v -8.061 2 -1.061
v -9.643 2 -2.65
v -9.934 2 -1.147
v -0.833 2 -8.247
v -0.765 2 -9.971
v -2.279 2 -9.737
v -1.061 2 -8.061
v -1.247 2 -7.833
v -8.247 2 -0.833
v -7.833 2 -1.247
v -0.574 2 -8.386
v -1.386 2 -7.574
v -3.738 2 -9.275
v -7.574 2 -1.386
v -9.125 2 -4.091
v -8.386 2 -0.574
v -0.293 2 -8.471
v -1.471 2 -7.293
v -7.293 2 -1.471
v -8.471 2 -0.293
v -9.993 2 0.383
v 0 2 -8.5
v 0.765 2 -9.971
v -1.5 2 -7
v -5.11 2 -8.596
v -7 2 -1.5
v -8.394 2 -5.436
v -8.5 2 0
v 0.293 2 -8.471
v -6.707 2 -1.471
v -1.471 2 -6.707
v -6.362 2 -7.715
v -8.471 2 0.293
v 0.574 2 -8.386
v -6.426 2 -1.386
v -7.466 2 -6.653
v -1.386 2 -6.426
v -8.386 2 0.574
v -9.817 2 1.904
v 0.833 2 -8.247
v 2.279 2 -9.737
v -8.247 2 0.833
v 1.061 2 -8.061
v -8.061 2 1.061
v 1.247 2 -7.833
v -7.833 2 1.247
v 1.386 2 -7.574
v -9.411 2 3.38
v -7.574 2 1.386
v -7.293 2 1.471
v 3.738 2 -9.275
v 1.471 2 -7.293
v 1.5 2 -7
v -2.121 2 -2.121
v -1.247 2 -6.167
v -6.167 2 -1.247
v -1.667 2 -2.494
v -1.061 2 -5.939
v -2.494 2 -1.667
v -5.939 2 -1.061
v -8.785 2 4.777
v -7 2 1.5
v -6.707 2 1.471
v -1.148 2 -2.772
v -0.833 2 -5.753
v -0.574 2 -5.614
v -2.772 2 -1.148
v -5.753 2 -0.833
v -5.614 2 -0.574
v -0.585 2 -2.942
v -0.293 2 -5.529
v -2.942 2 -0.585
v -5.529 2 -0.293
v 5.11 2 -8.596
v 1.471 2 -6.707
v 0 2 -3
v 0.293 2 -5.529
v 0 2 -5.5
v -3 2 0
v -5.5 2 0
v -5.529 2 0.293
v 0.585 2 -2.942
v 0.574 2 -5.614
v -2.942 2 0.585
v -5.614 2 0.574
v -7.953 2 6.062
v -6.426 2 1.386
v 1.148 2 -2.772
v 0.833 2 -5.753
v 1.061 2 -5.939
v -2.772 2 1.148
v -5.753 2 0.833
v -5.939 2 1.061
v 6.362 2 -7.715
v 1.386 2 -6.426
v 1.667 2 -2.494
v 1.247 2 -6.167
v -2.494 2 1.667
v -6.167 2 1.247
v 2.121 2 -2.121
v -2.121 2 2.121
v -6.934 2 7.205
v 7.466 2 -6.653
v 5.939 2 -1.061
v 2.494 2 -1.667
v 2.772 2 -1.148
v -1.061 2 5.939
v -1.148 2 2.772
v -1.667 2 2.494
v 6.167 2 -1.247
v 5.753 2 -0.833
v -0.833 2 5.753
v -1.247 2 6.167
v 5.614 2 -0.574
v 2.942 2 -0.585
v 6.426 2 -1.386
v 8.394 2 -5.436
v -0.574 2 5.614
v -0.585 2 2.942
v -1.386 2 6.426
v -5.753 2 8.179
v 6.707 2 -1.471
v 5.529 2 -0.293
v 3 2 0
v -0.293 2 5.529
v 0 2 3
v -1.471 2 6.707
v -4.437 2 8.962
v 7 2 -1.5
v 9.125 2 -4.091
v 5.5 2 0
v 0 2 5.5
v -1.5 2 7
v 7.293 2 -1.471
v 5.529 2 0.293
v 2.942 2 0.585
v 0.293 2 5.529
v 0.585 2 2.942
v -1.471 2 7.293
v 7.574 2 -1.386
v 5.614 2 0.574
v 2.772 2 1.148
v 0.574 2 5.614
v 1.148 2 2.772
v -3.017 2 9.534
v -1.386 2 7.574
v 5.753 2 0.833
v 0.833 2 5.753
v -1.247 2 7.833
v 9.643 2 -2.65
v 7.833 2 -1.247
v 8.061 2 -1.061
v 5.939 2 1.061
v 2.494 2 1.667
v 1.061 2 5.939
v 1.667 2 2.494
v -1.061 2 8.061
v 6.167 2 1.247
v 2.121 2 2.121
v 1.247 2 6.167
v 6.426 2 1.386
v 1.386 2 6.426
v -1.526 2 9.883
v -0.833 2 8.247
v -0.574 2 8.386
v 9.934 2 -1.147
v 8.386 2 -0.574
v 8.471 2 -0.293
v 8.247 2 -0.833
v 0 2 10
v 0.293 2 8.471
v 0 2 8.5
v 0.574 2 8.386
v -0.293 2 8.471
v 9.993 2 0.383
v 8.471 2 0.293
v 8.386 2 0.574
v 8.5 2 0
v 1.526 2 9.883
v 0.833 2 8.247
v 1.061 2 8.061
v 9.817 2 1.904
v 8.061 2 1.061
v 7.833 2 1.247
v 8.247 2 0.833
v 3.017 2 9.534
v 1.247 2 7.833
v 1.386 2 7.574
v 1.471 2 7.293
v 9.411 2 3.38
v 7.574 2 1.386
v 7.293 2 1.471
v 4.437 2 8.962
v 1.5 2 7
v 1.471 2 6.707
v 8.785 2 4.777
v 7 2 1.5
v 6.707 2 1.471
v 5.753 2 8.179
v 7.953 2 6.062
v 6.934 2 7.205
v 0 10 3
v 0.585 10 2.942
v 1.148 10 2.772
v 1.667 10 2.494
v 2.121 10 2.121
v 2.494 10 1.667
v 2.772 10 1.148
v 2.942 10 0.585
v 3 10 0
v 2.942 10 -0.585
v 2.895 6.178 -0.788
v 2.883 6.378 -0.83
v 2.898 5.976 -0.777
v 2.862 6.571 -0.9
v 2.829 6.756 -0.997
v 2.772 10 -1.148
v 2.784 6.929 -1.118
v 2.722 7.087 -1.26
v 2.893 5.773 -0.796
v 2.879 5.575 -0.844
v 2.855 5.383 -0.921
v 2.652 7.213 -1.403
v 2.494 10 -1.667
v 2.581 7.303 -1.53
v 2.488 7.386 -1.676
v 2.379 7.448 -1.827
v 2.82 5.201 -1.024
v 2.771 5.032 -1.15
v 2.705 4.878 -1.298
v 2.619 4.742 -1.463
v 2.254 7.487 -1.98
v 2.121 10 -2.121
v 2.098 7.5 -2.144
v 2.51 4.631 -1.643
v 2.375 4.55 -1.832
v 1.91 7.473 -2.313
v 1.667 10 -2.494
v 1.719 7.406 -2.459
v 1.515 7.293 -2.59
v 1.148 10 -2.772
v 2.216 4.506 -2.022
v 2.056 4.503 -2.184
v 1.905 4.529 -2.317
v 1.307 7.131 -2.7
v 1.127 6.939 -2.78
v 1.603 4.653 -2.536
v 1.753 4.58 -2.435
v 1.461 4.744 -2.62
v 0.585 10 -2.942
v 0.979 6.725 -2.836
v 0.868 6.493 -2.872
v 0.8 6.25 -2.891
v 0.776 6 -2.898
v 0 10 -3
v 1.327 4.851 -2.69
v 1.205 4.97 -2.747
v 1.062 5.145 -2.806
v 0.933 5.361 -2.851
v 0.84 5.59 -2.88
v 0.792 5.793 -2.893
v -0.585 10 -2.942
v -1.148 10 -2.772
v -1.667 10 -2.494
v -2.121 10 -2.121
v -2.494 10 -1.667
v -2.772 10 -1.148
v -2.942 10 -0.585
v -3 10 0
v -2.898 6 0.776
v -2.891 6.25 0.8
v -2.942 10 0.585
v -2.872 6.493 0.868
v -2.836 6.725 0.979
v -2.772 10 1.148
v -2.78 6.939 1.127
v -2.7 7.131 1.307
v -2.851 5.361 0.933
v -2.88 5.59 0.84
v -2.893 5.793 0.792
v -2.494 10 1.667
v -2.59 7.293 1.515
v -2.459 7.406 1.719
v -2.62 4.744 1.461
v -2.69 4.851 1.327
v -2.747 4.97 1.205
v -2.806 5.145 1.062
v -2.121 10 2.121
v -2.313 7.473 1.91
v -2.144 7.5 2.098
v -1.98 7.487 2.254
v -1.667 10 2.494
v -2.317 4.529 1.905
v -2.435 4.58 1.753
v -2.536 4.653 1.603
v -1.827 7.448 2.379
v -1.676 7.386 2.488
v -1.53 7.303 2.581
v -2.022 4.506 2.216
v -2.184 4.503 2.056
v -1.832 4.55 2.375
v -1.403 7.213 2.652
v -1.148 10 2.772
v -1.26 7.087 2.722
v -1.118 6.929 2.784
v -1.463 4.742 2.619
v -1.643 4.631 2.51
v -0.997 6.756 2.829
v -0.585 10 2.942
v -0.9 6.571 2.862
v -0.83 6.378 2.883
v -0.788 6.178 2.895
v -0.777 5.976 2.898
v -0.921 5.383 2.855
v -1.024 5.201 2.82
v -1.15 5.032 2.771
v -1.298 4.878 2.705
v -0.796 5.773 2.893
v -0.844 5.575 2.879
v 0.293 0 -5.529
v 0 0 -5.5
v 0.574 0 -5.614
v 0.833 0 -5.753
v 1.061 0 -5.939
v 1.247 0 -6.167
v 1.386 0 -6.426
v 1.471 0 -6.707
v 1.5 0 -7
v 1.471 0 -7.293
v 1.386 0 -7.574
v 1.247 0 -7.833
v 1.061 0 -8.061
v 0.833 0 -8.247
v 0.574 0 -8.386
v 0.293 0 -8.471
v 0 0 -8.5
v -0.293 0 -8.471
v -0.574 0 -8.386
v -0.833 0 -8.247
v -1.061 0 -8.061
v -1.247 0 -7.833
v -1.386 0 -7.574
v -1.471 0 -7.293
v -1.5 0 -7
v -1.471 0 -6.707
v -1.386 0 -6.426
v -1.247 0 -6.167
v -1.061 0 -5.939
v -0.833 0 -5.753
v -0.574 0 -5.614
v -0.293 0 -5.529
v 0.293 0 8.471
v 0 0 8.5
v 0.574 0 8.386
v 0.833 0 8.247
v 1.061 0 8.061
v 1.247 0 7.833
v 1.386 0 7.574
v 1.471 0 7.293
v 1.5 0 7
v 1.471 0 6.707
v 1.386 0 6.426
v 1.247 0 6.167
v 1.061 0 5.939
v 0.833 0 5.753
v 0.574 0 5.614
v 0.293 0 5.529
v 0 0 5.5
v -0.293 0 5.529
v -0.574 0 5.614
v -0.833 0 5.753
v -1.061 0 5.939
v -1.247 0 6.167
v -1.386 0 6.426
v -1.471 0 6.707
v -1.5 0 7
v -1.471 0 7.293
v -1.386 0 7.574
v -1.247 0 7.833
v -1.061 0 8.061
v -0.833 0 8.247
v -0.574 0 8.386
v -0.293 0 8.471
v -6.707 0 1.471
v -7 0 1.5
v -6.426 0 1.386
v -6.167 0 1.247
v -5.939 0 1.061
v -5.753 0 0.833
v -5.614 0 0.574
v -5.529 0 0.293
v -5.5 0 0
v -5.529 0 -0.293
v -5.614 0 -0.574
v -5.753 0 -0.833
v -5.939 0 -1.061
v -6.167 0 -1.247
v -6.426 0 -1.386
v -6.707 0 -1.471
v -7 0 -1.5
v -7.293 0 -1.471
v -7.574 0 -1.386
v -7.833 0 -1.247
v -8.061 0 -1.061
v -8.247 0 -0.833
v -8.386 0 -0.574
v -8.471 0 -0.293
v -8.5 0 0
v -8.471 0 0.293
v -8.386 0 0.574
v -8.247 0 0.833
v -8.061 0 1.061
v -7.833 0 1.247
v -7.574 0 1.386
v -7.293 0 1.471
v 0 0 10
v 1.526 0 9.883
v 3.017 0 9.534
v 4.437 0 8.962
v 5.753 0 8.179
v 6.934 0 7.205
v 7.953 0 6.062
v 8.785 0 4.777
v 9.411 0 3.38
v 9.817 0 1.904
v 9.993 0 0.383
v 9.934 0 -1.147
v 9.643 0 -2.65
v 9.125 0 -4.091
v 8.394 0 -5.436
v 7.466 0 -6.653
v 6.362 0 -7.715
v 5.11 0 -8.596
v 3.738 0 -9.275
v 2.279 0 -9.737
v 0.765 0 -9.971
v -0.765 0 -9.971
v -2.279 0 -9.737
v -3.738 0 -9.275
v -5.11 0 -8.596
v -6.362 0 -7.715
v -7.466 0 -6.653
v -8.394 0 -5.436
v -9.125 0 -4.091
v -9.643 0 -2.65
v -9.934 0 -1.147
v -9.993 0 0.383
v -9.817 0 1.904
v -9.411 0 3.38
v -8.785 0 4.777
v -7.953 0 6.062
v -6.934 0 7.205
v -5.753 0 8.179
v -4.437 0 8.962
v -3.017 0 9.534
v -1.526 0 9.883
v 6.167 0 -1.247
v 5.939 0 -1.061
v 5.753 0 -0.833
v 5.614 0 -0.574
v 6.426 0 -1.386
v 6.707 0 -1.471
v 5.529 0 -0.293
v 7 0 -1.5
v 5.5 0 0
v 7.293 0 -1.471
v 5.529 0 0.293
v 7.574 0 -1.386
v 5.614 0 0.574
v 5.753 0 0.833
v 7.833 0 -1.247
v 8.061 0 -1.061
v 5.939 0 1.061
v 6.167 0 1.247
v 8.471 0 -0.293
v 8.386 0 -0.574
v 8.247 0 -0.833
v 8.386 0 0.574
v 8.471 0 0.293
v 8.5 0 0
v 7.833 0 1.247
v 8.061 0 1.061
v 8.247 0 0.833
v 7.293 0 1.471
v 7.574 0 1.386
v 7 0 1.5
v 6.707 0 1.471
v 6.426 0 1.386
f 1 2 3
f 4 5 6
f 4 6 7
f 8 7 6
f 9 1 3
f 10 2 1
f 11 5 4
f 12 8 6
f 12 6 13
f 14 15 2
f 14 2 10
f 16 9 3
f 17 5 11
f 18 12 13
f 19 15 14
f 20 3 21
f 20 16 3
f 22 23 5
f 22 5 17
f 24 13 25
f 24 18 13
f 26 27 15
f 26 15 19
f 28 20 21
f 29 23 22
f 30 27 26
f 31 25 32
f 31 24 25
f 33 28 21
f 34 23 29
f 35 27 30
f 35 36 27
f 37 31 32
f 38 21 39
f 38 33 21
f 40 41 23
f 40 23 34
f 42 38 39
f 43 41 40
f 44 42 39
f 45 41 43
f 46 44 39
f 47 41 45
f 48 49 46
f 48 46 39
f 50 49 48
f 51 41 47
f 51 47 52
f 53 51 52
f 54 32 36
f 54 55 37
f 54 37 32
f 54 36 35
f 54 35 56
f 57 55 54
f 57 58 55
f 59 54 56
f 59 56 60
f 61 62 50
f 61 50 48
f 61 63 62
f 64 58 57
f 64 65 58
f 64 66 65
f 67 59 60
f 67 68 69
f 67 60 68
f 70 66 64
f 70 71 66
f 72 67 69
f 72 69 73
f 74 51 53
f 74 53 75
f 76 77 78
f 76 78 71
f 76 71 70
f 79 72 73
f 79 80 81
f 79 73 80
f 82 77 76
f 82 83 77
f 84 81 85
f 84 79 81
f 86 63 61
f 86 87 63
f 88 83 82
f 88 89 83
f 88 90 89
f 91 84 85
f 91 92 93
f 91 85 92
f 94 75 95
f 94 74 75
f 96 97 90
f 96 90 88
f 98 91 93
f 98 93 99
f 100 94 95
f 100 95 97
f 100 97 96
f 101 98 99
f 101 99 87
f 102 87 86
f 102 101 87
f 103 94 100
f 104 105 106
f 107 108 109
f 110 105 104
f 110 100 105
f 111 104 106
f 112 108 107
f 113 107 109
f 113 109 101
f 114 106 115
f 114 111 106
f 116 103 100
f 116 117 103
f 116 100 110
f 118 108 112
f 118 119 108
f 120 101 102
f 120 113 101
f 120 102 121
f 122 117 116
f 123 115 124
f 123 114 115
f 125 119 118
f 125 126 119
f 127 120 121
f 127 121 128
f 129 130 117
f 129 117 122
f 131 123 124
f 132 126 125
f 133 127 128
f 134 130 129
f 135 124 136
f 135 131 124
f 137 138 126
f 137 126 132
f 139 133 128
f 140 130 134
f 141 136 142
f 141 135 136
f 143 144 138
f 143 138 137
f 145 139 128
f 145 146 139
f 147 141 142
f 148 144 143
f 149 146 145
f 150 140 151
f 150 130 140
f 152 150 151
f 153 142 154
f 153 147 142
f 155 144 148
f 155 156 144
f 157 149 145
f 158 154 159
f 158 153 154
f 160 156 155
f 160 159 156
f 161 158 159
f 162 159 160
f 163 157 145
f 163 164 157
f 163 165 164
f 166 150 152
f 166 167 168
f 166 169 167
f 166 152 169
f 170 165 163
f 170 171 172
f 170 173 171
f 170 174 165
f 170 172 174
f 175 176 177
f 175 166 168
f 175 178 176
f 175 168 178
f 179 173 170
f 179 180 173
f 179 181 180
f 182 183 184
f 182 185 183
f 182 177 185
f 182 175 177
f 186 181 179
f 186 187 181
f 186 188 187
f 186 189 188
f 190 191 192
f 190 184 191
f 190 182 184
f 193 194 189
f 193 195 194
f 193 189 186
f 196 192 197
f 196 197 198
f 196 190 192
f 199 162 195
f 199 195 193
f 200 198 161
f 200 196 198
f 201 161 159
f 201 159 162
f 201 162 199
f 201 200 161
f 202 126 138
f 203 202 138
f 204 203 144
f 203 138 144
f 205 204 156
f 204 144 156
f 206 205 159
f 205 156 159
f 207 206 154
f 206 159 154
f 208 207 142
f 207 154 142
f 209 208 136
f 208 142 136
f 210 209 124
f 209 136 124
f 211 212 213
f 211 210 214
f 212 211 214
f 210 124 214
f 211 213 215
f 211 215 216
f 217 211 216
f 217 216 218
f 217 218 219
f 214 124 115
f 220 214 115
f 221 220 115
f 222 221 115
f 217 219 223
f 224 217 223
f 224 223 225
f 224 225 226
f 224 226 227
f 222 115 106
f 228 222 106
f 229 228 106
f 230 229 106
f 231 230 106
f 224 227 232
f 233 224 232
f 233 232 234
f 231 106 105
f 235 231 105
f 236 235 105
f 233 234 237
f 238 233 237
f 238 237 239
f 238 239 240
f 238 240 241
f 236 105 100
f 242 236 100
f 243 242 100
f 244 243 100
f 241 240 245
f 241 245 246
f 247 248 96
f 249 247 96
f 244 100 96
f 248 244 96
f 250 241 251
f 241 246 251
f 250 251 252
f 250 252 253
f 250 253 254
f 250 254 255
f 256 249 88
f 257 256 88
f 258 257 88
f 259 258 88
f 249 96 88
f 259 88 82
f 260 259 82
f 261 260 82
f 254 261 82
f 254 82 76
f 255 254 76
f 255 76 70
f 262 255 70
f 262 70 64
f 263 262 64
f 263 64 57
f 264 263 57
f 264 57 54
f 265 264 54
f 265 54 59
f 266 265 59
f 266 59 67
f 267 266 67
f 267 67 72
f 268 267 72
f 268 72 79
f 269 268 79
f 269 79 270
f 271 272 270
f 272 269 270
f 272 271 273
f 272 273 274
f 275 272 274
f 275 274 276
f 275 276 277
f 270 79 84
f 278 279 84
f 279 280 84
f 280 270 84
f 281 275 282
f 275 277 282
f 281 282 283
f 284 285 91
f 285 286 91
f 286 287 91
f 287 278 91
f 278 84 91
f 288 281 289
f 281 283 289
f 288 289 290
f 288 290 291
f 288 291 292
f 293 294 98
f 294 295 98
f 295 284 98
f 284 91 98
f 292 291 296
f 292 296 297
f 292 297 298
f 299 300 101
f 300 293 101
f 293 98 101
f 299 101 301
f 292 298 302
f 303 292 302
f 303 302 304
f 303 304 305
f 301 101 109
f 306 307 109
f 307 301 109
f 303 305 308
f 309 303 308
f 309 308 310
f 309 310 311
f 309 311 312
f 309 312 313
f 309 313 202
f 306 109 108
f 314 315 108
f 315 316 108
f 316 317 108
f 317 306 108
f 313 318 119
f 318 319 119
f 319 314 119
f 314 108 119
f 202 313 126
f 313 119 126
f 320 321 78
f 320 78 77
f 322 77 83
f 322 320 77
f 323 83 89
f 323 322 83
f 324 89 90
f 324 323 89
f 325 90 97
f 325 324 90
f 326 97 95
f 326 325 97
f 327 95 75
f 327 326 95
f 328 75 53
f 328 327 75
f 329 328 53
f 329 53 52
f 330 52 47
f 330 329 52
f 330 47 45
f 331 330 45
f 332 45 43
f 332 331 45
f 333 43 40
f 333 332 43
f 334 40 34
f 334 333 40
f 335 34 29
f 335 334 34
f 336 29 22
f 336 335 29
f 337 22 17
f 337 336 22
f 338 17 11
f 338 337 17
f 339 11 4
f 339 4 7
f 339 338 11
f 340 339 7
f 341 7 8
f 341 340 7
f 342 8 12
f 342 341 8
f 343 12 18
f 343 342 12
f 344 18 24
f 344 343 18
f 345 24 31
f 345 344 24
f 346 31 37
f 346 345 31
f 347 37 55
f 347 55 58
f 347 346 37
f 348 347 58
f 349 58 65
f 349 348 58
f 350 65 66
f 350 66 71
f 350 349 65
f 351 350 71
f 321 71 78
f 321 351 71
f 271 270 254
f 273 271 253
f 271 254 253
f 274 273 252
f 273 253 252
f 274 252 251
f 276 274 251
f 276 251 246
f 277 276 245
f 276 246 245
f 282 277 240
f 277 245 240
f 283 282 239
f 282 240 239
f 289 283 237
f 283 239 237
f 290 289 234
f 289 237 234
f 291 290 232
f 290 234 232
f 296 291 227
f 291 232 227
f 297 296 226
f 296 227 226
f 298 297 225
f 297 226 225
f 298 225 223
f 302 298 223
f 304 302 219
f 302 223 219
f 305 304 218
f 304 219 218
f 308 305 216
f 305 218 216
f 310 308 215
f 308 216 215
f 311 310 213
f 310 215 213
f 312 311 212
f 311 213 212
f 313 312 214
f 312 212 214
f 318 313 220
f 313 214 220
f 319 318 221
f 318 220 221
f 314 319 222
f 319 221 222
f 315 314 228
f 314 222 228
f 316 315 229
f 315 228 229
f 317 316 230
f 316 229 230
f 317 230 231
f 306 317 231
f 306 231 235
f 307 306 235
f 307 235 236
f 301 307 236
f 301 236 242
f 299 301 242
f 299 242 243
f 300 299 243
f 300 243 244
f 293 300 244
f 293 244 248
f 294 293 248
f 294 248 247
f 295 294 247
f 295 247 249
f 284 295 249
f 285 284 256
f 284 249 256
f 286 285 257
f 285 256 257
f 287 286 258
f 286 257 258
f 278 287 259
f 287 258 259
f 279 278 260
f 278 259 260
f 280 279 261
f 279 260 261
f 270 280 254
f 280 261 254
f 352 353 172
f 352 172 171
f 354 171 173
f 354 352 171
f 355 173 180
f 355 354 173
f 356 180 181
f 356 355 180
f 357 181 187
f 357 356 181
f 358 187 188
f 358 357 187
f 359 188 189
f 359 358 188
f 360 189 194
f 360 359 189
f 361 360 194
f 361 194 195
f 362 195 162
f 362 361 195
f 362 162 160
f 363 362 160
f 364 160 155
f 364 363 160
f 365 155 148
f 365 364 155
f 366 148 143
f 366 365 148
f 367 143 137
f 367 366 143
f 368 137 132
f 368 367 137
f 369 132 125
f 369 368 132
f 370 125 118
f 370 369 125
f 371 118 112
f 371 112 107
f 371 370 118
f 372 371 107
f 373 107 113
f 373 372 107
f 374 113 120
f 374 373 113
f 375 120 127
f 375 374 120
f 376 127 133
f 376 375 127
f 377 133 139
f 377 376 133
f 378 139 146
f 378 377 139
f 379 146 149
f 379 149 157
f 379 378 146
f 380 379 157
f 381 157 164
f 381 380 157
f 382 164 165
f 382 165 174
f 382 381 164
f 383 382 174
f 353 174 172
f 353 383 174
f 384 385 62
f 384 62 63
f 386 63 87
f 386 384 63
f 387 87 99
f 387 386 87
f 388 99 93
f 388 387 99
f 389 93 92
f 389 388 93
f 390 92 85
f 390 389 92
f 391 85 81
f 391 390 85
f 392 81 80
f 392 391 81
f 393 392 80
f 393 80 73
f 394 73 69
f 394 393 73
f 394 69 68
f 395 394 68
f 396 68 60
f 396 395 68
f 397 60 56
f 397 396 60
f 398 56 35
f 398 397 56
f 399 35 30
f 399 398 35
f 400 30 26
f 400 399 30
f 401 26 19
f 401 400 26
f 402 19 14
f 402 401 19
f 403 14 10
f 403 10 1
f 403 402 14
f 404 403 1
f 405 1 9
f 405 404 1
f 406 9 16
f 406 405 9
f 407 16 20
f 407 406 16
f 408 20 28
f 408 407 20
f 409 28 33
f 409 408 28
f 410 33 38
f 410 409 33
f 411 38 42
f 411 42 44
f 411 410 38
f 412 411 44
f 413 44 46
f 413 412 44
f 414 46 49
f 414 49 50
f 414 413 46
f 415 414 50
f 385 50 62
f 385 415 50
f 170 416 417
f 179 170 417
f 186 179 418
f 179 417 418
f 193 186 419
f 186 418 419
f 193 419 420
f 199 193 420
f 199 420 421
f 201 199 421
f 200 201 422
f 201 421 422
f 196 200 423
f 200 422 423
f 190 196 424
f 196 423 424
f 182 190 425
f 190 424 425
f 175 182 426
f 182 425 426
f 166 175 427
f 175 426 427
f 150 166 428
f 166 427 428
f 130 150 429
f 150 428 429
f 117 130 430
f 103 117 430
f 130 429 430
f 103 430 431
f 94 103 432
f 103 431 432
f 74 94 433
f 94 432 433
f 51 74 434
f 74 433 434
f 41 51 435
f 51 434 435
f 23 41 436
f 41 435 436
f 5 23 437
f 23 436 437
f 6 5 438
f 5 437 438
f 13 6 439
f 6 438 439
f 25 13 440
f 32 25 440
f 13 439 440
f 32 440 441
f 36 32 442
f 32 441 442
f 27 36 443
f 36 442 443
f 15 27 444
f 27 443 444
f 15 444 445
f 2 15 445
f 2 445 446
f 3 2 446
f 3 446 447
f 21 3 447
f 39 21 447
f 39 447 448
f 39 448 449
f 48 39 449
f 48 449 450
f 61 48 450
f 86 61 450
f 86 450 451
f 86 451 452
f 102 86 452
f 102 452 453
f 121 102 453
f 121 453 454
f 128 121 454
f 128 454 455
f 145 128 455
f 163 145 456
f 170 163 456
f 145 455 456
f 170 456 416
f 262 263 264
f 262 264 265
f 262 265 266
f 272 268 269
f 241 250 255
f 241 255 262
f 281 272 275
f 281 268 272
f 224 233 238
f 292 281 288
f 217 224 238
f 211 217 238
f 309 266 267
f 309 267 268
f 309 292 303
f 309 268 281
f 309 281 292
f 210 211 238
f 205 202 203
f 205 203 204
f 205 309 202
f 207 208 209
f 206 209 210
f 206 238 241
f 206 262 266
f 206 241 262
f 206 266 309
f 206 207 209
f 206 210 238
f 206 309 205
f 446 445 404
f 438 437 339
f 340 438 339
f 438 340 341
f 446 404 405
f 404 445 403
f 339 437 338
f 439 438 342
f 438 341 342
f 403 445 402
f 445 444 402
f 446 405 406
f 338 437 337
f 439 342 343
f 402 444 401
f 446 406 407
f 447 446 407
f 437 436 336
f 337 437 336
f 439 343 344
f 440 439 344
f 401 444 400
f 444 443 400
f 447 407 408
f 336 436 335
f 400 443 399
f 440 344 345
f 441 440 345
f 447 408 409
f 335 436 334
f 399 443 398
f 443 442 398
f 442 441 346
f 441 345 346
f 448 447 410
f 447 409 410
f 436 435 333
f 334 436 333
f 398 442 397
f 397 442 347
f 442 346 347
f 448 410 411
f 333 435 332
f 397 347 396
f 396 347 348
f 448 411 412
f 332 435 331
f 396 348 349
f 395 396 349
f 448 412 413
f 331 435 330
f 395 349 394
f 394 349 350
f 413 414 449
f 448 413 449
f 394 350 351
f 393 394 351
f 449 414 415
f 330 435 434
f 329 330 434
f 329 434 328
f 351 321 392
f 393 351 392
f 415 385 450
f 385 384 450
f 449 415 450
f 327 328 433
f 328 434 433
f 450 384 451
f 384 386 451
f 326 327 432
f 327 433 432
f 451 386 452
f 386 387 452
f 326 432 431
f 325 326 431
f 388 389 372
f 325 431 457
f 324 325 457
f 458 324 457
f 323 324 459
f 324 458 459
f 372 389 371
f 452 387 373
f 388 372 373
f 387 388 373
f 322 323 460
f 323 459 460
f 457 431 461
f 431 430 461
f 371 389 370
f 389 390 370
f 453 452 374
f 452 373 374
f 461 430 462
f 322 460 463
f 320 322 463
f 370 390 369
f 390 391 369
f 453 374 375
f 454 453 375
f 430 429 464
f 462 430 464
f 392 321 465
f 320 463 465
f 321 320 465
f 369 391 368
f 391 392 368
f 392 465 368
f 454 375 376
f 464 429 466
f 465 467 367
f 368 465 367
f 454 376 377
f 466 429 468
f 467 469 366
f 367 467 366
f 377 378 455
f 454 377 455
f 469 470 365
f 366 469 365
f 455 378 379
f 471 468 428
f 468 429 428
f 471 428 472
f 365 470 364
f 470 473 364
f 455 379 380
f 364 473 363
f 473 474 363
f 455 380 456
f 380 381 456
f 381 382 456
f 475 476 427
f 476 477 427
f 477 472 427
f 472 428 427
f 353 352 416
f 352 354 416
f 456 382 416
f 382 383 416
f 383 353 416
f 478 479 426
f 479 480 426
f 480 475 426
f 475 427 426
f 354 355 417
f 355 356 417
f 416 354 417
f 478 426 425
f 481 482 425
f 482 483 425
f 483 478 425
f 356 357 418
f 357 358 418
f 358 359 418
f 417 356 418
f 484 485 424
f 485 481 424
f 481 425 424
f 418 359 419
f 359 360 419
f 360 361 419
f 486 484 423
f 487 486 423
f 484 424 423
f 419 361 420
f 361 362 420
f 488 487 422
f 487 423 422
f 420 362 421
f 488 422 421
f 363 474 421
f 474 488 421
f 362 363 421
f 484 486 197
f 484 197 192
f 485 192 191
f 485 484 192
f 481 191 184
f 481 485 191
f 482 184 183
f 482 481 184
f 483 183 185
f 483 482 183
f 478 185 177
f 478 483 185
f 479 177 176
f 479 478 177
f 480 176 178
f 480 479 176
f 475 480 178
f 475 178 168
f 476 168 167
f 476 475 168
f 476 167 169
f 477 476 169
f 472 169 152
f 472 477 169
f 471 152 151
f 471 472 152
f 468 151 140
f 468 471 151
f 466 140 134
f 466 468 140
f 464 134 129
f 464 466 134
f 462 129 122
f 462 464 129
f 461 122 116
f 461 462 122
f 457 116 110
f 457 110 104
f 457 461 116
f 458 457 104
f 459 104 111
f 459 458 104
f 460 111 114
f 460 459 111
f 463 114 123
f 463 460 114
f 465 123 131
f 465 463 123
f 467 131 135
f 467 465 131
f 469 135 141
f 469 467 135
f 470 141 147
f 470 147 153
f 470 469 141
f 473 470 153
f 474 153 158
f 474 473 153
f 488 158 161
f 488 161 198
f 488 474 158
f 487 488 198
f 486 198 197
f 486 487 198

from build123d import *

# Parameters (mm, degrees)
SKETCH_1_R          = 10
SKETCH_1_R_2        = 3
SKETCH_1_R_3        = 1.5
EXTRUDE_1_DEPTH     = 2
SKETCH_2_R          = 3
EXTRUDE_2_DEPTH     = 10
SKETCH_5_R          = 1.5
CUT_EXTRUDE_3_DEPTH = 5


with BuildPart() as part:
    # 草图1 → 凸台-拉伸1 (new body)
    with BuildSketch(Plane(origin=(0, 0, 0), x_dir=(1, 0, 0), z_dir=(0, 1, 0))):
        Circle(SKETCH_1_R)
        Circle(SKETCH_1_R_2, mode=Mode.SUBTRACT)
        with Locations((0, 7)):
            Circle(SKETCH_1_R_3, mode=Mode.SUBTRACT)
        with Locations((7, 0)):
            Circle(SKETCH_1_R_3, mode=Mode.SUBTRACT)
        with Locations((0, -7)):
            Circle(SKETCH_1_R_3, mode=Mode.SUBTRACT)
        with Locations((-7, 0)):
            Circle(SKETCH_1_R_3, mode=Mode.SUBTRACT)
    extrude(amount=EXTRUDE_1_DEPTH)

    # 草图2 → 凸台-拉伸2 (add)
    with BuildSketch(Plane(origin=(0, 0, 0), x_dir=(1, 0, 0), z_dir=(0, 1, 0))):
        Circle(SKETCH_2_R)
    extrude(amount=EXTRUDE_2_DEPTH)

    # 草图5 → 切除-拉伸3 (cut, symmetric)
    with BuildSketch(Plane(origin=(0, 0, 0), x_dir=(0, 1, 0), z_dir=(0.7071067811865438, 0, -0.7071067811865512))):
        with Locations((6, 0)):
            Circle(SKETCH_5_R)
    extrude(amount=CUT_EXTRUDE_3_DEPTH, both=True, mode=Mode.SUBTRACT)


solid = part.part
